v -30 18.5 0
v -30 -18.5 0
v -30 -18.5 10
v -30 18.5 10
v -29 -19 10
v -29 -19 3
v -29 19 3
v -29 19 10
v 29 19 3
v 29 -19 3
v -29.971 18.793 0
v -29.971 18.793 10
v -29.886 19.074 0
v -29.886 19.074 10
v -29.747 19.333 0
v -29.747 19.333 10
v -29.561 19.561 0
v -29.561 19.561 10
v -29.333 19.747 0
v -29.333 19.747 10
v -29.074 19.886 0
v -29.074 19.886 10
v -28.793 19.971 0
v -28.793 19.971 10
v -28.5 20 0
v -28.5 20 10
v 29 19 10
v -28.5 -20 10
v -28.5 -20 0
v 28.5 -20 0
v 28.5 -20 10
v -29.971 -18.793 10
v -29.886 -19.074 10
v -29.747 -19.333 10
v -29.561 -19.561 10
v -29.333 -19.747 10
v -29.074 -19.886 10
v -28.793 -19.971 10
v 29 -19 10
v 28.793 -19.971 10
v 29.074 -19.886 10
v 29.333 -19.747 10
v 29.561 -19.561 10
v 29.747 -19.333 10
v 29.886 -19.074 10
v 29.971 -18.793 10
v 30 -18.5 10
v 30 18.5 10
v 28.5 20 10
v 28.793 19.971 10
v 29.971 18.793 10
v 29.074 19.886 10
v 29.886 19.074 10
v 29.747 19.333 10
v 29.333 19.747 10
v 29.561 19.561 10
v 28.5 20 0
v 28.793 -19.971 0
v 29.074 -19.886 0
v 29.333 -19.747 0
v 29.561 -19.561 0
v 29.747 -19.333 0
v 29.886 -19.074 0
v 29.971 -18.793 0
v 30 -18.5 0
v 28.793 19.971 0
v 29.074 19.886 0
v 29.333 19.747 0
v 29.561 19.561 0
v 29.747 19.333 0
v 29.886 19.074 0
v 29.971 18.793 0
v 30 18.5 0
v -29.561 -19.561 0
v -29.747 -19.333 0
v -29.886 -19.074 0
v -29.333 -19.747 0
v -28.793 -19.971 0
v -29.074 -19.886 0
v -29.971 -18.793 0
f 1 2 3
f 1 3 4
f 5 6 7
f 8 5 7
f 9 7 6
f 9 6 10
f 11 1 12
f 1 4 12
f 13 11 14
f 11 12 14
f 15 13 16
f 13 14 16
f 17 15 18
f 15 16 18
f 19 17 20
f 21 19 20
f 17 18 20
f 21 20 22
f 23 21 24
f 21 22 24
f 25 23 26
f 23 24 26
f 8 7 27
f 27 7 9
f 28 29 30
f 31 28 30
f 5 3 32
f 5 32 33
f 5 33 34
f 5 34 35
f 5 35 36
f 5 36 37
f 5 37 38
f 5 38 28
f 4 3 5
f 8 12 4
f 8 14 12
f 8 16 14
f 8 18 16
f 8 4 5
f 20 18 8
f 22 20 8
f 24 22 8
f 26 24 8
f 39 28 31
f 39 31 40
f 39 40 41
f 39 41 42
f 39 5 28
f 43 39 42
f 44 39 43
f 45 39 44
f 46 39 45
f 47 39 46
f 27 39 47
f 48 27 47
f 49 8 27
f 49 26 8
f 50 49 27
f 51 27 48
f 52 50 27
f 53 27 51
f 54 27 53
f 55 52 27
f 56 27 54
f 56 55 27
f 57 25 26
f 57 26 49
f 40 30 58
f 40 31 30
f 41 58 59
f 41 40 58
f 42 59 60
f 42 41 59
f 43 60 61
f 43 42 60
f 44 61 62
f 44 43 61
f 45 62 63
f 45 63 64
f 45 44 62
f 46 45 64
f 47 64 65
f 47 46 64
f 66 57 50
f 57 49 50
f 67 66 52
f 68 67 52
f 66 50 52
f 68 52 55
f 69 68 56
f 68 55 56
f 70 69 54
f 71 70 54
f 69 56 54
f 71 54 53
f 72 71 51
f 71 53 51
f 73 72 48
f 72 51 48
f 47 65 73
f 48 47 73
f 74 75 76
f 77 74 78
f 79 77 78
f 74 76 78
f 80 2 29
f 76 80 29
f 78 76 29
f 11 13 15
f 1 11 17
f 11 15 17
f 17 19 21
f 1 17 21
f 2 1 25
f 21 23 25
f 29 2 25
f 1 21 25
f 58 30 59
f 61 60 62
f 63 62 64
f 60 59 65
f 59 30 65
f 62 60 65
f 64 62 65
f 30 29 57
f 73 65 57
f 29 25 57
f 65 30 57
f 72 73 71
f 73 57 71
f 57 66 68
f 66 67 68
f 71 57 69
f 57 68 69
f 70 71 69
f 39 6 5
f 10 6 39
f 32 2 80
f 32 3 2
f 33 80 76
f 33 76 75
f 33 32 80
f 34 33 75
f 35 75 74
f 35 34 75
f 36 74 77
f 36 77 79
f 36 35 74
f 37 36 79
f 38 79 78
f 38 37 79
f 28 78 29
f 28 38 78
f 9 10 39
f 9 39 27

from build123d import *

# Parameters (mm, degrees)
F0_W     = 58
F0_H     = 38
F1_DEPTH = 3
F0_W_2   = 60
F0_H_2   = 40
F2_DEPTH = 10
F3_R     = 1.5


with BuildPart() as f1:
    # F0 (on Top) → F1 (new body)
    with BuildSketch(Plane.XY):
        Rectangle(F0_W, F0_H)
    extrude(amount=F1_DEPTH)

    # F0 (on Top) → F2 (join)
    with BuildSketch(Plane.XY):
        Rectangle(F0_W_2, F0_H_2)
        Rectangle(F0_W, F0_H, mode=Mode.SUBTRACT)
    extrude(amount=F2_DEPTH)

    # F3
    f3_edges = [f1.edges().sort_by_distance(p)[0] for p in [
        (-30, -20, 5),
        (30, -20, 5),
        (30, 20, 5),
        (-30, 20, 5),
    ]]
    fillet(f3_edges, radius=F3_R)


solid = f1.part
